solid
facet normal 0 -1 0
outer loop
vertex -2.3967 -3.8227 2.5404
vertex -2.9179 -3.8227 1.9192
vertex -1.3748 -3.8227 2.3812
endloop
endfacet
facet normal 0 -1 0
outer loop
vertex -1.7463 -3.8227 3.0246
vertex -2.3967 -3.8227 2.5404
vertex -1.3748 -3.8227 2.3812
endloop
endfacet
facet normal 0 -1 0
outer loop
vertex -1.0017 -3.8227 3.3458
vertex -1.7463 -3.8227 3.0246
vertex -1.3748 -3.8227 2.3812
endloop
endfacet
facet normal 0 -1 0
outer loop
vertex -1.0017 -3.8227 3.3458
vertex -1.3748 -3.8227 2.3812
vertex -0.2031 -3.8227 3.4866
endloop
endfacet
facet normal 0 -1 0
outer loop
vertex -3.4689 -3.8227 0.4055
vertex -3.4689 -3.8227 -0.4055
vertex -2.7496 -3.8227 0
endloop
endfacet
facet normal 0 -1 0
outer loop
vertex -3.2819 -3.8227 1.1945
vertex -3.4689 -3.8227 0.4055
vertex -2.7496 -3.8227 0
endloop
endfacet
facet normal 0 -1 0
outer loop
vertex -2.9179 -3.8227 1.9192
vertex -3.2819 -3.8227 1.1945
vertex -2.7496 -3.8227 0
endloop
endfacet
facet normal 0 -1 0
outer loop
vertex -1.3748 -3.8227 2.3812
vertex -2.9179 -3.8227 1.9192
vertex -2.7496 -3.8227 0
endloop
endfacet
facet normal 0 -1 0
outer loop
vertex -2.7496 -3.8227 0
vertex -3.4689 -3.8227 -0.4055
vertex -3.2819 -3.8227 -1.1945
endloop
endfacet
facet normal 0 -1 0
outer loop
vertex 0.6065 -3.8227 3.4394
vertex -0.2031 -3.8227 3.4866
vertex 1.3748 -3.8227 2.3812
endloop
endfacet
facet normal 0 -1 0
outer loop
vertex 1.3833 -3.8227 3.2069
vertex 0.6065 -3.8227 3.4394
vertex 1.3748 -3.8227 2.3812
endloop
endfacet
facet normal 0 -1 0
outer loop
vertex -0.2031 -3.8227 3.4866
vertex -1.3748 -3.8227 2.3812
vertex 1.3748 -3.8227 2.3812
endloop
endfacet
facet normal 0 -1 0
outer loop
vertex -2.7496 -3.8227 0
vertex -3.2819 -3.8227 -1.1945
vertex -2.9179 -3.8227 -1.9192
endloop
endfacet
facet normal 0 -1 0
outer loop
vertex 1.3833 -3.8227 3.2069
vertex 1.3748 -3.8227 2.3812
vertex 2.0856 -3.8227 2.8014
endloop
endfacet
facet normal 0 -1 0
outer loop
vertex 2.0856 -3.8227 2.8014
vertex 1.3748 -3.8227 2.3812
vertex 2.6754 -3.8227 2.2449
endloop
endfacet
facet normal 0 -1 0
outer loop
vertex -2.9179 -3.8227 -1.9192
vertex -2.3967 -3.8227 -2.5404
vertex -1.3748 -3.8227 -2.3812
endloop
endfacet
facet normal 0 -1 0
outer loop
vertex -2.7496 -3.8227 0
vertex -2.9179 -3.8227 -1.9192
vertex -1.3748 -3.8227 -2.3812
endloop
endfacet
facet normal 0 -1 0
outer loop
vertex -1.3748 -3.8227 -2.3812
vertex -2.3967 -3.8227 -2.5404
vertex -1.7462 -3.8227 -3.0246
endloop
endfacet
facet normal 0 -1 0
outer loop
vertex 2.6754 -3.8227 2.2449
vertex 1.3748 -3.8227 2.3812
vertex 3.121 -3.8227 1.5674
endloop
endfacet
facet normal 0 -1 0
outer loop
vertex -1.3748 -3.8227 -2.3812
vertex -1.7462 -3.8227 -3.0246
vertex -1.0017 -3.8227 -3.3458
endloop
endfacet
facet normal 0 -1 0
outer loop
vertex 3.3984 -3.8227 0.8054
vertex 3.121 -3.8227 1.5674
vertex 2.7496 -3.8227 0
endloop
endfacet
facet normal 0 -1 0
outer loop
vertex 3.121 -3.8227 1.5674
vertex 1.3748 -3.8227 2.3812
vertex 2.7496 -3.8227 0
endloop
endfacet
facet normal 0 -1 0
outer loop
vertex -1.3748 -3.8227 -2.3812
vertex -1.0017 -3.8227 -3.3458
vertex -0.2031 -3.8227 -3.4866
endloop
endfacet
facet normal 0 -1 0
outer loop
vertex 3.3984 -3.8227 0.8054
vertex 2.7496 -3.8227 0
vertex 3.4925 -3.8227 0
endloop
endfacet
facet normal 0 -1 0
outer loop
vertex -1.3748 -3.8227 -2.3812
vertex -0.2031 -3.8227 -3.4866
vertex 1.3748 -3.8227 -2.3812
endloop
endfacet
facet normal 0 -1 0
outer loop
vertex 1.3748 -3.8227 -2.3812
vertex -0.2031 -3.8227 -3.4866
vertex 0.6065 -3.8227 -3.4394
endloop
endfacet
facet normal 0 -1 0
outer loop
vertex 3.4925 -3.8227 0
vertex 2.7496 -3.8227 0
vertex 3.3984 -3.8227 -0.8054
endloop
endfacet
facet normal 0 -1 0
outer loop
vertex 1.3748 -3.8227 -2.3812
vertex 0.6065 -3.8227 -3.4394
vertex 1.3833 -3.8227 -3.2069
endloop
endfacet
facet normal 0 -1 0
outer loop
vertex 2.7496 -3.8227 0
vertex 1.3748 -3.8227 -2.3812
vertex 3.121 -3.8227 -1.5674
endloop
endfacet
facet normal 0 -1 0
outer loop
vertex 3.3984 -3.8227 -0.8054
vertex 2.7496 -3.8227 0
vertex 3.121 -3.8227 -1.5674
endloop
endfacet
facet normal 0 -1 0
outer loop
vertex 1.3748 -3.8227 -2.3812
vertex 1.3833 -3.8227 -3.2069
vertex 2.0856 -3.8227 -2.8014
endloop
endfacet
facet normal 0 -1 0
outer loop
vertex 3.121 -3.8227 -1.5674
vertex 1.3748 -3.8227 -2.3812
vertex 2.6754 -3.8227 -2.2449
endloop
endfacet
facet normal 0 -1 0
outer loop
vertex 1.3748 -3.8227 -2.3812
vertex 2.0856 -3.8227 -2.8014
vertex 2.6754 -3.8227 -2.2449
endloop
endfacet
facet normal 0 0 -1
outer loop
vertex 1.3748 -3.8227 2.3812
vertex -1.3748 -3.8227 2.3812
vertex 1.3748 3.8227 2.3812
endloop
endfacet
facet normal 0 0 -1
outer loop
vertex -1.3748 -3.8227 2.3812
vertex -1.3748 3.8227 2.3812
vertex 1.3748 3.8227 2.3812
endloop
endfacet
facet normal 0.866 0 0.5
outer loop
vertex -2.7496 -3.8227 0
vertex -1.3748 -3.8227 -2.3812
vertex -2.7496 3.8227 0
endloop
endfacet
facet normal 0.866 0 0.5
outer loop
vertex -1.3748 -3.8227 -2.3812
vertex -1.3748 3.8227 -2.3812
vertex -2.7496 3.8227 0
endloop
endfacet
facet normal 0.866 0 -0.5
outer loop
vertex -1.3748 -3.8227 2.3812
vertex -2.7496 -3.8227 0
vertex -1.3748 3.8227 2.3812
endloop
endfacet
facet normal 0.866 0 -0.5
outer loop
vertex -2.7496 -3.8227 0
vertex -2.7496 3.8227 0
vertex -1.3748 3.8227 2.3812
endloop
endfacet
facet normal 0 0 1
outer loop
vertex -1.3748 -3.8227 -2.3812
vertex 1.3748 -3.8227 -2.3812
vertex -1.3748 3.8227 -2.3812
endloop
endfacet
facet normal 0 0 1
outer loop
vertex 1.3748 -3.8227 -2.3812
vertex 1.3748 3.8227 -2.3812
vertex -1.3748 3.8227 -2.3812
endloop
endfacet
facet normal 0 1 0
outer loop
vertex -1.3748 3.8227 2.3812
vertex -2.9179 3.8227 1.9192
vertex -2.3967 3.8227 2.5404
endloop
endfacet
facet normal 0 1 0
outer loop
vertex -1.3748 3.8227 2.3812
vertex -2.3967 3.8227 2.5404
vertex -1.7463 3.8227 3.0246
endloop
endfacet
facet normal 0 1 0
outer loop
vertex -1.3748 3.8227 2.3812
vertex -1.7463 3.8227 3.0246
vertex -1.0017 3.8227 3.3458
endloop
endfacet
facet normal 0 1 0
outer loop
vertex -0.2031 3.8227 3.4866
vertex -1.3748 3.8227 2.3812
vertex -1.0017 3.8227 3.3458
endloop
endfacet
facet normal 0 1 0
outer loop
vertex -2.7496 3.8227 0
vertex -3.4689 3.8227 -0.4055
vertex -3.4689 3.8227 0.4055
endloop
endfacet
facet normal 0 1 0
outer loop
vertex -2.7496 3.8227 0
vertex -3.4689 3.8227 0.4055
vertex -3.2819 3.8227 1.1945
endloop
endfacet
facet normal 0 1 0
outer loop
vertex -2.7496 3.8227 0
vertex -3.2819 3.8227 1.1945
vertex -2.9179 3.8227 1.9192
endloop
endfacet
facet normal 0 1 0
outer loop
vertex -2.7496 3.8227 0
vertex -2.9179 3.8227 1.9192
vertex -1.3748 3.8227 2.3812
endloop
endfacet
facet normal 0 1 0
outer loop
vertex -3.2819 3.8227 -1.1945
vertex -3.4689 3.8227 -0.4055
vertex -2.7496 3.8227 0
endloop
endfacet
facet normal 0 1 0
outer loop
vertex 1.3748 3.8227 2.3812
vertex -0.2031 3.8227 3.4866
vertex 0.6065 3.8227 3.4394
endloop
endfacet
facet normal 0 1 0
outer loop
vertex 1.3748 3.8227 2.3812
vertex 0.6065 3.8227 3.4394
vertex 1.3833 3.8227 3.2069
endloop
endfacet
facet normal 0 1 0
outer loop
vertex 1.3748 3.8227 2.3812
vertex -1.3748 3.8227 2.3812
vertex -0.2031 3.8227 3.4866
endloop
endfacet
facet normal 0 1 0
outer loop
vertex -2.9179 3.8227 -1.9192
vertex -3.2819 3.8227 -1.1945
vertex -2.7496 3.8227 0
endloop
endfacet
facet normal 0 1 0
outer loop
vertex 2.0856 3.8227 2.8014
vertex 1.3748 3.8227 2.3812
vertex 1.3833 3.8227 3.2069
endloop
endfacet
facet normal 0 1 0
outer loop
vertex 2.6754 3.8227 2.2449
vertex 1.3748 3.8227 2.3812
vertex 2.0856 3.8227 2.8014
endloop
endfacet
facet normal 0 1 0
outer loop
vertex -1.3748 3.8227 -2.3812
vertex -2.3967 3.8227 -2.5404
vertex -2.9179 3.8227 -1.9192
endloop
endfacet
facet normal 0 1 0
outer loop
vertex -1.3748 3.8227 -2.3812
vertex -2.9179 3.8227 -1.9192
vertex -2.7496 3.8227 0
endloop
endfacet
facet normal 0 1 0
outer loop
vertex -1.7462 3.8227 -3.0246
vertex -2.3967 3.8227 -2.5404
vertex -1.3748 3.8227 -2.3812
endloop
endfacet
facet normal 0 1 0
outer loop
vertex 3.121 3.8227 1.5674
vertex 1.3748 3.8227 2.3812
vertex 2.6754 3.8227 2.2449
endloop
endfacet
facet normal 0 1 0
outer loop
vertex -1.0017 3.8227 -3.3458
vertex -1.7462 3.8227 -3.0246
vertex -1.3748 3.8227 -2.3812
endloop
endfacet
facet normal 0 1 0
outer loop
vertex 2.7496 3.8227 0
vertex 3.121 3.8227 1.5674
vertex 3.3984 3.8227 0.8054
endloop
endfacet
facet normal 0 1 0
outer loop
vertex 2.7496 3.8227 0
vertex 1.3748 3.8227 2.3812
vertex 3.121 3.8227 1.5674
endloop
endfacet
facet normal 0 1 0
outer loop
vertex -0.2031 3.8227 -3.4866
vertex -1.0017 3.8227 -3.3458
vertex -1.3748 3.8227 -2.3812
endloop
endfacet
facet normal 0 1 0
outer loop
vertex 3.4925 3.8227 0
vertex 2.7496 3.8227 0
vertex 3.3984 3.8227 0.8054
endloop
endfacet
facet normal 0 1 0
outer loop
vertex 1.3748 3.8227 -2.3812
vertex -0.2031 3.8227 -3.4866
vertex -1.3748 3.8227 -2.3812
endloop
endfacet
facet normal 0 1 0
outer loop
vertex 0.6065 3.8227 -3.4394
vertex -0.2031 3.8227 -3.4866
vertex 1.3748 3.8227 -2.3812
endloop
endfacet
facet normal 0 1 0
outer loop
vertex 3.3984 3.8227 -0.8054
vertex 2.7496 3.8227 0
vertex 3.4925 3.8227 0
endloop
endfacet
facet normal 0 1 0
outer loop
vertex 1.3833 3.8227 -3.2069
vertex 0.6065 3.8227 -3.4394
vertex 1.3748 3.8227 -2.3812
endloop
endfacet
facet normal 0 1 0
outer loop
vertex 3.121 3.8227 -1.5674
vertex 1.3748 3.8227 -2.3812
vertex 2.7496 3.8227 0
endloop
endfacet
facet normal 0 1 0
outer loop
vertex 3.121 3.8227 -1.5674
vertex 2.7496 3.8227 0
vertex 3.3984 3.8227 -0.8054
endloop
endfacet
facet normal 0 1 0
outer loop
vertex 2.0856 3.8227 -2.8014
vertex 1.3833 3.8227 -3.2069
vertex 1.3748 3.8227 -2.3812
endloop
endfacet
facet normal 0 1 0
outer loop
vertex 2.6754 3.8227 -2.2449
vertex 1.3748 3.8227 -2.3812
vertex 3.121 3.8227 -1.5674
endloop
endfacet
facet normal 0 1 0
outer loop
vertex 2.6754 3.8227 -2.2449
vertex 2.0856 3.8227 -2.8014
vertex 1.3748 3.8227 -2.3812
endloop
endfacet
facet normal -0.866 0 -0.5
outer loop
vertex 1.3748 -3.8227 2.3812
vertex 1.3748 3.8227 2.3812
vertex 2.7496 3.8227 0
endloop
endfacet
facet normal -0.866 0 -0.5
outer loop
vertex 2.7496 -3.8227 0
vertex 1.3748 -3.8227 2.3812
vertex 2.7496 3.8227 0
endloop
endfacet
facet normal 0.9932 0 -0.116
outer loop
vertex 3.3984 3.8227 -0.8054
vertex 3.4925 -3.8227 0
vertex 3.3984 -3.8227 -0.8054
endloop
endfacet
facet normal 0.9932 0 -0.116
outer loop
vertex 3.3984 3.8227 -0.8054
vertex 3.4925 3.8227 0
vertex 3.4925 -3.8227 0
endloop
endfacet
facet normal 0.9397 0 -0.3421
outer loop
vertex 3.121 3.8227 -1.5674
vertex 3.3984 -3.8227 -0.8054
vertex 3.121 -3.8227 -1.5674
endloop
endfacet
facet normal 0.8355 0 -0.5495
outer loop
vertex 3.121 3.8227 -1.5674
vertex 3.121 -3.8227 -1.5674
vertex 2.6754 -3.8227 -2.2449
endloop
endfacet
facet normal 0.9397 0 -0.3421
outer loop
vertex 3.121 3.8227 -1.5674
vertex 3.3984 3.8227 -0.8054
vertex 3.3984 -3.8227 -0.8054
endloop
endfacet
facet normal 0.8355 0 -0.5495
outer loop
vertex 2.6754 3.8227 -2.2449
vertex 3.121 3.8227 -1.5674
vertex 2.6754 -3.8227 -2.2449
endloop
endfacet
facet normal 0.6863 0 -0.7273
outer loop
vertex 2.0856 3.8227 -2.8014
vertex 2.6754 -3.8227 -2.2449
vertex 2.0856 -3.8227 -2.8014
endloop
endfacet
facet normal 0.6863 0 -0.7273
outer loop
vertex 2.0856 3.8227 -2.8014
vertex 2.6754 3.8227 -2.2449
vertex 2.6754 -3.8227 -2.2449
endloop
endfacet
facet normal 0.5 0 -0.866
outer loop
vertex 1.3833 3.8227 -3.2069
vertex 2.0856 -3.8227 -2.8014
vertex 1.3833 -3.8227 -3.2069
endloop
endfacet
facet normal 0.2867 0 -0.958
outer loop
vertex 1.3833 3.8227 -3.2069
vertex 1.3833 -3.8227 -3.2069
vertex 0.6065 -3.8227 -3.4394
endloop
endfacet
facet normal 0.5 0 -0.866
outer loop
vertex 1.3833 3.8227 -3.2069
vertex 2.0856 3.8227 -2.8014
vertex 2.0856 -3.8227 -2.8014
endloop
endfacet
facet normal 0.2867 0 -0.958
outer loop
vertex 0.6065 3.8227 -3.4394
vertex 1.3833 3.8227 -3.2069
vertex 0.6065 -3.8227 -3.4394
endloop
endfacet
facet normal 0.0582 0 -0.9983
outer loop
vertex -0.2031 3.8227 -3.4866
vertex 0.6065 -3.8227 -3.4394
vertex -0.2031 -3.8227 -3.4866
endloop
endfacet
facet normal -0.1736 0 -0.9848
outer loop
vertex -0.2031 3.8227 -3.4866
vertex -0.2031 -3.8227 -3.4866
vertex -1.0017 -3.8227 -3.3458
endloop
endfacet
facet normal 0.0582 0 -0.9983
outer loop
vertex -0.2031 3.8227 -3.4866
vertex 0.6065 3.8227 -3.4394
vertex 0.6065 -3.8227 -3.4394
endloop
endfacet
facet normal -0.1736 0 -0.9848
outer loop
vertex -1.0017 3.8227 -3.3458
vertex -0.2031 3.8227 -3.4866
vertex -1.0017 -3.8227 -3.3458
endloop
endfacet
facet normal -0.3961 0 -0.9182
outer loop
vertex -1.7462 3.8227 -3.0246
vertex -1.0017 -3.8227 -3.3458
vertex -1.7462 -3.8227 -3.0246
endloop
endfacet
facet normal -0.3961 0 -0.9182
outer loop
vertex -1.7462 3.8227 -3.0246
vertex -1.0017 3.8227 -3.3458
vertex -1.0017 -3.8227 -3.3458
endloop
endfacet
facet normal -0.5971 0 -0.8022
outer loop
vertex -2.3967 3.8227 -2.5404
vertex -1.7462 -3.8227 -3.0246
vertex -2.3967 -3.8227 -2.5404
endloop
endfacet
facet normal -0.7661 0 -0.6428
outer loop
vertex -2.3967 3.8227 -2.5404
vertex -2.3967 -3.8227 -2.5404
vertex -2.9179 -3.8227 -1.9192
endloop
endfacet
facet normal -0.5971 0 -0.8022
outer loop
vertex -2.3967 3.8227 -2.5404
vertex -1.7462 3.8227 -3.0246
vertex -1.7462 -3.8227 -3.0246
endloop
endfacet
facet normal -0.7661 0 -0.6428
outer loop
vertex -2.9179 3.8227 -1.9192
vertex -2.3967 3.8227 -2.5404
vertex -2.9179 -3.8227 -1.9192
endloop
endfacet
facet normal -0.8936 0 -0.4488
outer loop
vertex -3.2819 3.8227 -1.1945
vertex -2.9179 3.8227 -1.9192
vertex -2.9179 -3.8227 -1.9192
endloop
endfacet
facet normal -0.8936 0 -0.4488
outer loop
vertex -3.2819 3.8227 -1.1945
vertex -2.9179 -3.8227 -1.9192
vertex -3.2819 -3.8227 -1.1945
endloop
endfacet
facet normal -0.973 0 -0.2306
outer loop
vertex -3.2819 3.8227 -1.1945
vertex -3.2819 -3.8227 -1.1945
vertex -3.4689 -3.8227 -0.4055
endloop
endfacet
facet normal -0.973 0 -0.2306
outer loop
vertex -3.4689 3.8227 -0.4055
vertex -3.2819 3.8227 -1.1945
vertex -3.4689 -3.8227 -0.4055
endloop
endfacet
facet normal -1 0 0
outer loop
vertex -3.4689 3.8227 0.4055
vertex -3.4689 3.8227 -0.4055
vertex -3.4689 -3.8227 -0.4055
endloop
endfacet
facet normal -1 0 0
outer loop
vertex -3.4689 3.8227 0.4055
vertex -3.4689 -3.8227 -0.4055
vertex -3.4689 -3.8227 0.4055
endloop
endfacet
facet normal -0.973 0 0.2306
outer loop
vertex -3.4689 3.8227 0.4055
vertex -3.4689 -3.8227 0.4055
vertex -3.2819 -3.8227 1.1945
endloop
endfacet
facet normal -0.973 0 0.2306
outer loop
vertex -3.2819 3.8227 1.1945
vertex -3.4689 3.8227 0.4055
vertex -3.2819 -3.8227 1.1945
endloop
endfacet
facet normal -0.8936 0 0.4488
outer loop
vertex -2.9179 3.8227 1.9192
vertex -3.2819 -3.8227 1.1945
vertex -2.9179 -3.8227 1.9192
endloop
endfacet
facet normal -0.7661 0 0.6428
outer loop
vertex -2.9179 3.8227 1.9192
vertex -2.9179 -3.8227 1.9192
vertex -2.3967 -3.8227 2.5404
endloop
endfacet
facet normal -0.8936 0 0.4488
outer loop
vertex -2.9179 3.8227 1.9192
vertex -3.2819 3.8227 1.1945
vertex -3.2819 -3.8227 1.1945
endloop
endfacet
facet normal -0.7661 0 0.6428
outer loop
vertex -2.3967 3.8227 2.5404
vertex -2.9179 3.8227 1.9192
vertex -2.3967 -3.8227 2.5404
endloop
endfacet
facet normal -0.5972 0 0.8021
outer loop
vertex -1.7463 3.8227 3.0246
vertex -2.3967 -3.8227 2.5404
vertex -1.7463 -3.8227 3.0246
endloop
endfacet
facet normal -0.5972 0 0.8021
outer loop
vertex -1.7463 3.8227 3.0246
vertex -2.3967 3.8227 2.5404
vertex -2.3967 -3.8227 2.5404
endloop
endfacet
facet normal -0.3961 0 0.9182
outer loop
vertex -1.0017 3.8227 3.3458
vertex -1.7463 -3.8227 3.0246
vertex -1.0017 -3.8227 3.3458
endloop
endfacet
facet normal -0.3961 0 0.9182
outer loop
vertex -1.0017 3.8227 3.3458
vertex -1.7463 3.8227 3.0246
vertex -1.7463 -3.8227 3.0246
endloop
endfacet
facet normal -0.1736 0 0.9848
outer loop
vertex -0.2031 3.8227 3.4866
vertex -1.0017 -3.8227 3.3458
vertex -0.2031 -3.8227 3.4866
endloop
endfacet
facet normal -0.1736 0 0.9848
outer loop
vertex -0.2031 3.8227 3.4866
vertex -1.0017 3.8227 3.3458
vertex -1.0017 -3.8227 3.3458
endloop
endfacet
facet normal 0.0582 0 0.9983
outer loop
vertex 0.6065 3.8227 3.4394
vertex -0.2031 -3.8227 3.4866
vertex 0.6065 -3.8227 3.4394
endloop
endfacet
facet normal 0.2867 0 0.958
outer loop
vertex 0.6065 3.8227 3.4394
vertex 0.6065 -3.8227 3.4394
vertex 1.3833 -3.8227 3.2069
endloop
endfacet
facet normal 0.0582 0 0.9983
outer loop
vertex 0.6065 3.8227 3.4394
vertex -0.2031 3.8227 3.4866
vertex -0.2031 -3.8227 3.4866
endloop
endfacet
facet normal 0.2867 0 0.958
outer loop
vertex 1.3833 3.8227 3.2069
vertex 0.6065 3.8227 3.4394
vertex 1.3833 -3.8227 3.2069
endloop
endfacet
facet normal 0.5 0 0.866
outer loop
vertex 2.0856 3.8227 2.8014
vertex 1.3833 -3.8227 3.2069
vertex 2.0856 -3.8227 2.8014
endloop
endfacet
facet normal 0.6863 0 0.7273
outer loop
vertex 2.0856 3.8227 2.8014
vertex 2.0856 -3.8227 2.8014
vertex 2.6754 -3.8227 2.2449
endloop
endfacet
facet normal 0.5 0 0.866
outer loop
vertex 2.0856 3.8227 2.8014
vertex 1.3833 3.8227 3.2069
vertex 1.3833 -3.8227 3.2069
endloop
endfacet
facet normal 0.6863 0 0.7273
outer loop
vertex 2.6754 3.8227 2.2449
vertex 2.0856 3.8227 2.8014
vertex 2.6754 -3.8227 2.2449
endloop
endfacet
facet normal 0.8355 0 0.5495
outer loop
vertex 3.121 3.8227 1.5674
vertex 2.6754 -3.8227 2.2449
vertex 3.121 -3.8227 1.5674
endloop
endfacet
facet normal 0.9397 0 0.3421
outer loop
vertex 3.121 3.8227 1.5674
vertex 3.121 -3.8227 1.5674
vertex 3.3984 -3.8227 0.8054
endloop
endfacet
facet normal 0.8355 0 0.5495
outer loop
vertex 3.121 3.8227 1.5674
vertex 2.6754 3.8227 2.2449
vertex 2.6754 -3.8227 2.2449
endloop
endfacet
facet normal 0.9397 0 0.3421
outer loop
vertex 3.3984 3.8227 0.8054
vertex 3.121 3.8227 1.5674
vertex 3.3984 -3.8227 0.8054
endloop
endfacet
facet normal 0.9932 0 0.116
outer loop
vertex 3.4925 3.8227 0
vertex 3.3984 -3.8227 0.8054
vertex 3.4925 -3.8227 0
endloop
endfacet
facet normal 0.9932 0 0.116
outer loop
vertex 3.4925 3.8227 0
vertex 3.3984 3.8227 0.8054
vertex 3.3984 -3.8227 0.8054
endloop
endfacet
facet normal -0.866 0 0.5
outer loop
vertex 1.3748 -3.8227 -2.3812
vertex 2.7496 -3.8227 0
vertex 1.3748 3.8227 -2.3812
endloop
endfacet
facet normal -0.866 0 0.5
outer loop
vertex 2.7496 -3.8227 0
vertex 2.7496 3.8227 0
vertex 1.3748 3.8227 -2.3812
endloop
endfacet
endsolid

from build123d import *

# Parameters (mm, degrees)
SKETCH1_R           = 3.4925
BOSS_EXTRUDE1_DEPTH = 3.8227


with BuildPart() as part:
    # Sketch1 → Boss-Extrude1 (new body, symmetric)
    with BuildSketch(Plane(origin=(0, 0, 0), x_dir=(1, 0, 0), z_dir=(0, 1, 0))):
        Circle(SKETCH1_R)
        Polygon((1.374815329, -2.38125), (2.749630657, 0), (1.374815329, 2.38125), (-1.374815329, 2.38125), (-2.749630657, 0), (-1.374815329, -2.38125), align=None, mode=Mode.SUBTRACT)
    extrude(amount=BOSS_EXTRUDE1_DEPTH, both=True)


solid = part.part
